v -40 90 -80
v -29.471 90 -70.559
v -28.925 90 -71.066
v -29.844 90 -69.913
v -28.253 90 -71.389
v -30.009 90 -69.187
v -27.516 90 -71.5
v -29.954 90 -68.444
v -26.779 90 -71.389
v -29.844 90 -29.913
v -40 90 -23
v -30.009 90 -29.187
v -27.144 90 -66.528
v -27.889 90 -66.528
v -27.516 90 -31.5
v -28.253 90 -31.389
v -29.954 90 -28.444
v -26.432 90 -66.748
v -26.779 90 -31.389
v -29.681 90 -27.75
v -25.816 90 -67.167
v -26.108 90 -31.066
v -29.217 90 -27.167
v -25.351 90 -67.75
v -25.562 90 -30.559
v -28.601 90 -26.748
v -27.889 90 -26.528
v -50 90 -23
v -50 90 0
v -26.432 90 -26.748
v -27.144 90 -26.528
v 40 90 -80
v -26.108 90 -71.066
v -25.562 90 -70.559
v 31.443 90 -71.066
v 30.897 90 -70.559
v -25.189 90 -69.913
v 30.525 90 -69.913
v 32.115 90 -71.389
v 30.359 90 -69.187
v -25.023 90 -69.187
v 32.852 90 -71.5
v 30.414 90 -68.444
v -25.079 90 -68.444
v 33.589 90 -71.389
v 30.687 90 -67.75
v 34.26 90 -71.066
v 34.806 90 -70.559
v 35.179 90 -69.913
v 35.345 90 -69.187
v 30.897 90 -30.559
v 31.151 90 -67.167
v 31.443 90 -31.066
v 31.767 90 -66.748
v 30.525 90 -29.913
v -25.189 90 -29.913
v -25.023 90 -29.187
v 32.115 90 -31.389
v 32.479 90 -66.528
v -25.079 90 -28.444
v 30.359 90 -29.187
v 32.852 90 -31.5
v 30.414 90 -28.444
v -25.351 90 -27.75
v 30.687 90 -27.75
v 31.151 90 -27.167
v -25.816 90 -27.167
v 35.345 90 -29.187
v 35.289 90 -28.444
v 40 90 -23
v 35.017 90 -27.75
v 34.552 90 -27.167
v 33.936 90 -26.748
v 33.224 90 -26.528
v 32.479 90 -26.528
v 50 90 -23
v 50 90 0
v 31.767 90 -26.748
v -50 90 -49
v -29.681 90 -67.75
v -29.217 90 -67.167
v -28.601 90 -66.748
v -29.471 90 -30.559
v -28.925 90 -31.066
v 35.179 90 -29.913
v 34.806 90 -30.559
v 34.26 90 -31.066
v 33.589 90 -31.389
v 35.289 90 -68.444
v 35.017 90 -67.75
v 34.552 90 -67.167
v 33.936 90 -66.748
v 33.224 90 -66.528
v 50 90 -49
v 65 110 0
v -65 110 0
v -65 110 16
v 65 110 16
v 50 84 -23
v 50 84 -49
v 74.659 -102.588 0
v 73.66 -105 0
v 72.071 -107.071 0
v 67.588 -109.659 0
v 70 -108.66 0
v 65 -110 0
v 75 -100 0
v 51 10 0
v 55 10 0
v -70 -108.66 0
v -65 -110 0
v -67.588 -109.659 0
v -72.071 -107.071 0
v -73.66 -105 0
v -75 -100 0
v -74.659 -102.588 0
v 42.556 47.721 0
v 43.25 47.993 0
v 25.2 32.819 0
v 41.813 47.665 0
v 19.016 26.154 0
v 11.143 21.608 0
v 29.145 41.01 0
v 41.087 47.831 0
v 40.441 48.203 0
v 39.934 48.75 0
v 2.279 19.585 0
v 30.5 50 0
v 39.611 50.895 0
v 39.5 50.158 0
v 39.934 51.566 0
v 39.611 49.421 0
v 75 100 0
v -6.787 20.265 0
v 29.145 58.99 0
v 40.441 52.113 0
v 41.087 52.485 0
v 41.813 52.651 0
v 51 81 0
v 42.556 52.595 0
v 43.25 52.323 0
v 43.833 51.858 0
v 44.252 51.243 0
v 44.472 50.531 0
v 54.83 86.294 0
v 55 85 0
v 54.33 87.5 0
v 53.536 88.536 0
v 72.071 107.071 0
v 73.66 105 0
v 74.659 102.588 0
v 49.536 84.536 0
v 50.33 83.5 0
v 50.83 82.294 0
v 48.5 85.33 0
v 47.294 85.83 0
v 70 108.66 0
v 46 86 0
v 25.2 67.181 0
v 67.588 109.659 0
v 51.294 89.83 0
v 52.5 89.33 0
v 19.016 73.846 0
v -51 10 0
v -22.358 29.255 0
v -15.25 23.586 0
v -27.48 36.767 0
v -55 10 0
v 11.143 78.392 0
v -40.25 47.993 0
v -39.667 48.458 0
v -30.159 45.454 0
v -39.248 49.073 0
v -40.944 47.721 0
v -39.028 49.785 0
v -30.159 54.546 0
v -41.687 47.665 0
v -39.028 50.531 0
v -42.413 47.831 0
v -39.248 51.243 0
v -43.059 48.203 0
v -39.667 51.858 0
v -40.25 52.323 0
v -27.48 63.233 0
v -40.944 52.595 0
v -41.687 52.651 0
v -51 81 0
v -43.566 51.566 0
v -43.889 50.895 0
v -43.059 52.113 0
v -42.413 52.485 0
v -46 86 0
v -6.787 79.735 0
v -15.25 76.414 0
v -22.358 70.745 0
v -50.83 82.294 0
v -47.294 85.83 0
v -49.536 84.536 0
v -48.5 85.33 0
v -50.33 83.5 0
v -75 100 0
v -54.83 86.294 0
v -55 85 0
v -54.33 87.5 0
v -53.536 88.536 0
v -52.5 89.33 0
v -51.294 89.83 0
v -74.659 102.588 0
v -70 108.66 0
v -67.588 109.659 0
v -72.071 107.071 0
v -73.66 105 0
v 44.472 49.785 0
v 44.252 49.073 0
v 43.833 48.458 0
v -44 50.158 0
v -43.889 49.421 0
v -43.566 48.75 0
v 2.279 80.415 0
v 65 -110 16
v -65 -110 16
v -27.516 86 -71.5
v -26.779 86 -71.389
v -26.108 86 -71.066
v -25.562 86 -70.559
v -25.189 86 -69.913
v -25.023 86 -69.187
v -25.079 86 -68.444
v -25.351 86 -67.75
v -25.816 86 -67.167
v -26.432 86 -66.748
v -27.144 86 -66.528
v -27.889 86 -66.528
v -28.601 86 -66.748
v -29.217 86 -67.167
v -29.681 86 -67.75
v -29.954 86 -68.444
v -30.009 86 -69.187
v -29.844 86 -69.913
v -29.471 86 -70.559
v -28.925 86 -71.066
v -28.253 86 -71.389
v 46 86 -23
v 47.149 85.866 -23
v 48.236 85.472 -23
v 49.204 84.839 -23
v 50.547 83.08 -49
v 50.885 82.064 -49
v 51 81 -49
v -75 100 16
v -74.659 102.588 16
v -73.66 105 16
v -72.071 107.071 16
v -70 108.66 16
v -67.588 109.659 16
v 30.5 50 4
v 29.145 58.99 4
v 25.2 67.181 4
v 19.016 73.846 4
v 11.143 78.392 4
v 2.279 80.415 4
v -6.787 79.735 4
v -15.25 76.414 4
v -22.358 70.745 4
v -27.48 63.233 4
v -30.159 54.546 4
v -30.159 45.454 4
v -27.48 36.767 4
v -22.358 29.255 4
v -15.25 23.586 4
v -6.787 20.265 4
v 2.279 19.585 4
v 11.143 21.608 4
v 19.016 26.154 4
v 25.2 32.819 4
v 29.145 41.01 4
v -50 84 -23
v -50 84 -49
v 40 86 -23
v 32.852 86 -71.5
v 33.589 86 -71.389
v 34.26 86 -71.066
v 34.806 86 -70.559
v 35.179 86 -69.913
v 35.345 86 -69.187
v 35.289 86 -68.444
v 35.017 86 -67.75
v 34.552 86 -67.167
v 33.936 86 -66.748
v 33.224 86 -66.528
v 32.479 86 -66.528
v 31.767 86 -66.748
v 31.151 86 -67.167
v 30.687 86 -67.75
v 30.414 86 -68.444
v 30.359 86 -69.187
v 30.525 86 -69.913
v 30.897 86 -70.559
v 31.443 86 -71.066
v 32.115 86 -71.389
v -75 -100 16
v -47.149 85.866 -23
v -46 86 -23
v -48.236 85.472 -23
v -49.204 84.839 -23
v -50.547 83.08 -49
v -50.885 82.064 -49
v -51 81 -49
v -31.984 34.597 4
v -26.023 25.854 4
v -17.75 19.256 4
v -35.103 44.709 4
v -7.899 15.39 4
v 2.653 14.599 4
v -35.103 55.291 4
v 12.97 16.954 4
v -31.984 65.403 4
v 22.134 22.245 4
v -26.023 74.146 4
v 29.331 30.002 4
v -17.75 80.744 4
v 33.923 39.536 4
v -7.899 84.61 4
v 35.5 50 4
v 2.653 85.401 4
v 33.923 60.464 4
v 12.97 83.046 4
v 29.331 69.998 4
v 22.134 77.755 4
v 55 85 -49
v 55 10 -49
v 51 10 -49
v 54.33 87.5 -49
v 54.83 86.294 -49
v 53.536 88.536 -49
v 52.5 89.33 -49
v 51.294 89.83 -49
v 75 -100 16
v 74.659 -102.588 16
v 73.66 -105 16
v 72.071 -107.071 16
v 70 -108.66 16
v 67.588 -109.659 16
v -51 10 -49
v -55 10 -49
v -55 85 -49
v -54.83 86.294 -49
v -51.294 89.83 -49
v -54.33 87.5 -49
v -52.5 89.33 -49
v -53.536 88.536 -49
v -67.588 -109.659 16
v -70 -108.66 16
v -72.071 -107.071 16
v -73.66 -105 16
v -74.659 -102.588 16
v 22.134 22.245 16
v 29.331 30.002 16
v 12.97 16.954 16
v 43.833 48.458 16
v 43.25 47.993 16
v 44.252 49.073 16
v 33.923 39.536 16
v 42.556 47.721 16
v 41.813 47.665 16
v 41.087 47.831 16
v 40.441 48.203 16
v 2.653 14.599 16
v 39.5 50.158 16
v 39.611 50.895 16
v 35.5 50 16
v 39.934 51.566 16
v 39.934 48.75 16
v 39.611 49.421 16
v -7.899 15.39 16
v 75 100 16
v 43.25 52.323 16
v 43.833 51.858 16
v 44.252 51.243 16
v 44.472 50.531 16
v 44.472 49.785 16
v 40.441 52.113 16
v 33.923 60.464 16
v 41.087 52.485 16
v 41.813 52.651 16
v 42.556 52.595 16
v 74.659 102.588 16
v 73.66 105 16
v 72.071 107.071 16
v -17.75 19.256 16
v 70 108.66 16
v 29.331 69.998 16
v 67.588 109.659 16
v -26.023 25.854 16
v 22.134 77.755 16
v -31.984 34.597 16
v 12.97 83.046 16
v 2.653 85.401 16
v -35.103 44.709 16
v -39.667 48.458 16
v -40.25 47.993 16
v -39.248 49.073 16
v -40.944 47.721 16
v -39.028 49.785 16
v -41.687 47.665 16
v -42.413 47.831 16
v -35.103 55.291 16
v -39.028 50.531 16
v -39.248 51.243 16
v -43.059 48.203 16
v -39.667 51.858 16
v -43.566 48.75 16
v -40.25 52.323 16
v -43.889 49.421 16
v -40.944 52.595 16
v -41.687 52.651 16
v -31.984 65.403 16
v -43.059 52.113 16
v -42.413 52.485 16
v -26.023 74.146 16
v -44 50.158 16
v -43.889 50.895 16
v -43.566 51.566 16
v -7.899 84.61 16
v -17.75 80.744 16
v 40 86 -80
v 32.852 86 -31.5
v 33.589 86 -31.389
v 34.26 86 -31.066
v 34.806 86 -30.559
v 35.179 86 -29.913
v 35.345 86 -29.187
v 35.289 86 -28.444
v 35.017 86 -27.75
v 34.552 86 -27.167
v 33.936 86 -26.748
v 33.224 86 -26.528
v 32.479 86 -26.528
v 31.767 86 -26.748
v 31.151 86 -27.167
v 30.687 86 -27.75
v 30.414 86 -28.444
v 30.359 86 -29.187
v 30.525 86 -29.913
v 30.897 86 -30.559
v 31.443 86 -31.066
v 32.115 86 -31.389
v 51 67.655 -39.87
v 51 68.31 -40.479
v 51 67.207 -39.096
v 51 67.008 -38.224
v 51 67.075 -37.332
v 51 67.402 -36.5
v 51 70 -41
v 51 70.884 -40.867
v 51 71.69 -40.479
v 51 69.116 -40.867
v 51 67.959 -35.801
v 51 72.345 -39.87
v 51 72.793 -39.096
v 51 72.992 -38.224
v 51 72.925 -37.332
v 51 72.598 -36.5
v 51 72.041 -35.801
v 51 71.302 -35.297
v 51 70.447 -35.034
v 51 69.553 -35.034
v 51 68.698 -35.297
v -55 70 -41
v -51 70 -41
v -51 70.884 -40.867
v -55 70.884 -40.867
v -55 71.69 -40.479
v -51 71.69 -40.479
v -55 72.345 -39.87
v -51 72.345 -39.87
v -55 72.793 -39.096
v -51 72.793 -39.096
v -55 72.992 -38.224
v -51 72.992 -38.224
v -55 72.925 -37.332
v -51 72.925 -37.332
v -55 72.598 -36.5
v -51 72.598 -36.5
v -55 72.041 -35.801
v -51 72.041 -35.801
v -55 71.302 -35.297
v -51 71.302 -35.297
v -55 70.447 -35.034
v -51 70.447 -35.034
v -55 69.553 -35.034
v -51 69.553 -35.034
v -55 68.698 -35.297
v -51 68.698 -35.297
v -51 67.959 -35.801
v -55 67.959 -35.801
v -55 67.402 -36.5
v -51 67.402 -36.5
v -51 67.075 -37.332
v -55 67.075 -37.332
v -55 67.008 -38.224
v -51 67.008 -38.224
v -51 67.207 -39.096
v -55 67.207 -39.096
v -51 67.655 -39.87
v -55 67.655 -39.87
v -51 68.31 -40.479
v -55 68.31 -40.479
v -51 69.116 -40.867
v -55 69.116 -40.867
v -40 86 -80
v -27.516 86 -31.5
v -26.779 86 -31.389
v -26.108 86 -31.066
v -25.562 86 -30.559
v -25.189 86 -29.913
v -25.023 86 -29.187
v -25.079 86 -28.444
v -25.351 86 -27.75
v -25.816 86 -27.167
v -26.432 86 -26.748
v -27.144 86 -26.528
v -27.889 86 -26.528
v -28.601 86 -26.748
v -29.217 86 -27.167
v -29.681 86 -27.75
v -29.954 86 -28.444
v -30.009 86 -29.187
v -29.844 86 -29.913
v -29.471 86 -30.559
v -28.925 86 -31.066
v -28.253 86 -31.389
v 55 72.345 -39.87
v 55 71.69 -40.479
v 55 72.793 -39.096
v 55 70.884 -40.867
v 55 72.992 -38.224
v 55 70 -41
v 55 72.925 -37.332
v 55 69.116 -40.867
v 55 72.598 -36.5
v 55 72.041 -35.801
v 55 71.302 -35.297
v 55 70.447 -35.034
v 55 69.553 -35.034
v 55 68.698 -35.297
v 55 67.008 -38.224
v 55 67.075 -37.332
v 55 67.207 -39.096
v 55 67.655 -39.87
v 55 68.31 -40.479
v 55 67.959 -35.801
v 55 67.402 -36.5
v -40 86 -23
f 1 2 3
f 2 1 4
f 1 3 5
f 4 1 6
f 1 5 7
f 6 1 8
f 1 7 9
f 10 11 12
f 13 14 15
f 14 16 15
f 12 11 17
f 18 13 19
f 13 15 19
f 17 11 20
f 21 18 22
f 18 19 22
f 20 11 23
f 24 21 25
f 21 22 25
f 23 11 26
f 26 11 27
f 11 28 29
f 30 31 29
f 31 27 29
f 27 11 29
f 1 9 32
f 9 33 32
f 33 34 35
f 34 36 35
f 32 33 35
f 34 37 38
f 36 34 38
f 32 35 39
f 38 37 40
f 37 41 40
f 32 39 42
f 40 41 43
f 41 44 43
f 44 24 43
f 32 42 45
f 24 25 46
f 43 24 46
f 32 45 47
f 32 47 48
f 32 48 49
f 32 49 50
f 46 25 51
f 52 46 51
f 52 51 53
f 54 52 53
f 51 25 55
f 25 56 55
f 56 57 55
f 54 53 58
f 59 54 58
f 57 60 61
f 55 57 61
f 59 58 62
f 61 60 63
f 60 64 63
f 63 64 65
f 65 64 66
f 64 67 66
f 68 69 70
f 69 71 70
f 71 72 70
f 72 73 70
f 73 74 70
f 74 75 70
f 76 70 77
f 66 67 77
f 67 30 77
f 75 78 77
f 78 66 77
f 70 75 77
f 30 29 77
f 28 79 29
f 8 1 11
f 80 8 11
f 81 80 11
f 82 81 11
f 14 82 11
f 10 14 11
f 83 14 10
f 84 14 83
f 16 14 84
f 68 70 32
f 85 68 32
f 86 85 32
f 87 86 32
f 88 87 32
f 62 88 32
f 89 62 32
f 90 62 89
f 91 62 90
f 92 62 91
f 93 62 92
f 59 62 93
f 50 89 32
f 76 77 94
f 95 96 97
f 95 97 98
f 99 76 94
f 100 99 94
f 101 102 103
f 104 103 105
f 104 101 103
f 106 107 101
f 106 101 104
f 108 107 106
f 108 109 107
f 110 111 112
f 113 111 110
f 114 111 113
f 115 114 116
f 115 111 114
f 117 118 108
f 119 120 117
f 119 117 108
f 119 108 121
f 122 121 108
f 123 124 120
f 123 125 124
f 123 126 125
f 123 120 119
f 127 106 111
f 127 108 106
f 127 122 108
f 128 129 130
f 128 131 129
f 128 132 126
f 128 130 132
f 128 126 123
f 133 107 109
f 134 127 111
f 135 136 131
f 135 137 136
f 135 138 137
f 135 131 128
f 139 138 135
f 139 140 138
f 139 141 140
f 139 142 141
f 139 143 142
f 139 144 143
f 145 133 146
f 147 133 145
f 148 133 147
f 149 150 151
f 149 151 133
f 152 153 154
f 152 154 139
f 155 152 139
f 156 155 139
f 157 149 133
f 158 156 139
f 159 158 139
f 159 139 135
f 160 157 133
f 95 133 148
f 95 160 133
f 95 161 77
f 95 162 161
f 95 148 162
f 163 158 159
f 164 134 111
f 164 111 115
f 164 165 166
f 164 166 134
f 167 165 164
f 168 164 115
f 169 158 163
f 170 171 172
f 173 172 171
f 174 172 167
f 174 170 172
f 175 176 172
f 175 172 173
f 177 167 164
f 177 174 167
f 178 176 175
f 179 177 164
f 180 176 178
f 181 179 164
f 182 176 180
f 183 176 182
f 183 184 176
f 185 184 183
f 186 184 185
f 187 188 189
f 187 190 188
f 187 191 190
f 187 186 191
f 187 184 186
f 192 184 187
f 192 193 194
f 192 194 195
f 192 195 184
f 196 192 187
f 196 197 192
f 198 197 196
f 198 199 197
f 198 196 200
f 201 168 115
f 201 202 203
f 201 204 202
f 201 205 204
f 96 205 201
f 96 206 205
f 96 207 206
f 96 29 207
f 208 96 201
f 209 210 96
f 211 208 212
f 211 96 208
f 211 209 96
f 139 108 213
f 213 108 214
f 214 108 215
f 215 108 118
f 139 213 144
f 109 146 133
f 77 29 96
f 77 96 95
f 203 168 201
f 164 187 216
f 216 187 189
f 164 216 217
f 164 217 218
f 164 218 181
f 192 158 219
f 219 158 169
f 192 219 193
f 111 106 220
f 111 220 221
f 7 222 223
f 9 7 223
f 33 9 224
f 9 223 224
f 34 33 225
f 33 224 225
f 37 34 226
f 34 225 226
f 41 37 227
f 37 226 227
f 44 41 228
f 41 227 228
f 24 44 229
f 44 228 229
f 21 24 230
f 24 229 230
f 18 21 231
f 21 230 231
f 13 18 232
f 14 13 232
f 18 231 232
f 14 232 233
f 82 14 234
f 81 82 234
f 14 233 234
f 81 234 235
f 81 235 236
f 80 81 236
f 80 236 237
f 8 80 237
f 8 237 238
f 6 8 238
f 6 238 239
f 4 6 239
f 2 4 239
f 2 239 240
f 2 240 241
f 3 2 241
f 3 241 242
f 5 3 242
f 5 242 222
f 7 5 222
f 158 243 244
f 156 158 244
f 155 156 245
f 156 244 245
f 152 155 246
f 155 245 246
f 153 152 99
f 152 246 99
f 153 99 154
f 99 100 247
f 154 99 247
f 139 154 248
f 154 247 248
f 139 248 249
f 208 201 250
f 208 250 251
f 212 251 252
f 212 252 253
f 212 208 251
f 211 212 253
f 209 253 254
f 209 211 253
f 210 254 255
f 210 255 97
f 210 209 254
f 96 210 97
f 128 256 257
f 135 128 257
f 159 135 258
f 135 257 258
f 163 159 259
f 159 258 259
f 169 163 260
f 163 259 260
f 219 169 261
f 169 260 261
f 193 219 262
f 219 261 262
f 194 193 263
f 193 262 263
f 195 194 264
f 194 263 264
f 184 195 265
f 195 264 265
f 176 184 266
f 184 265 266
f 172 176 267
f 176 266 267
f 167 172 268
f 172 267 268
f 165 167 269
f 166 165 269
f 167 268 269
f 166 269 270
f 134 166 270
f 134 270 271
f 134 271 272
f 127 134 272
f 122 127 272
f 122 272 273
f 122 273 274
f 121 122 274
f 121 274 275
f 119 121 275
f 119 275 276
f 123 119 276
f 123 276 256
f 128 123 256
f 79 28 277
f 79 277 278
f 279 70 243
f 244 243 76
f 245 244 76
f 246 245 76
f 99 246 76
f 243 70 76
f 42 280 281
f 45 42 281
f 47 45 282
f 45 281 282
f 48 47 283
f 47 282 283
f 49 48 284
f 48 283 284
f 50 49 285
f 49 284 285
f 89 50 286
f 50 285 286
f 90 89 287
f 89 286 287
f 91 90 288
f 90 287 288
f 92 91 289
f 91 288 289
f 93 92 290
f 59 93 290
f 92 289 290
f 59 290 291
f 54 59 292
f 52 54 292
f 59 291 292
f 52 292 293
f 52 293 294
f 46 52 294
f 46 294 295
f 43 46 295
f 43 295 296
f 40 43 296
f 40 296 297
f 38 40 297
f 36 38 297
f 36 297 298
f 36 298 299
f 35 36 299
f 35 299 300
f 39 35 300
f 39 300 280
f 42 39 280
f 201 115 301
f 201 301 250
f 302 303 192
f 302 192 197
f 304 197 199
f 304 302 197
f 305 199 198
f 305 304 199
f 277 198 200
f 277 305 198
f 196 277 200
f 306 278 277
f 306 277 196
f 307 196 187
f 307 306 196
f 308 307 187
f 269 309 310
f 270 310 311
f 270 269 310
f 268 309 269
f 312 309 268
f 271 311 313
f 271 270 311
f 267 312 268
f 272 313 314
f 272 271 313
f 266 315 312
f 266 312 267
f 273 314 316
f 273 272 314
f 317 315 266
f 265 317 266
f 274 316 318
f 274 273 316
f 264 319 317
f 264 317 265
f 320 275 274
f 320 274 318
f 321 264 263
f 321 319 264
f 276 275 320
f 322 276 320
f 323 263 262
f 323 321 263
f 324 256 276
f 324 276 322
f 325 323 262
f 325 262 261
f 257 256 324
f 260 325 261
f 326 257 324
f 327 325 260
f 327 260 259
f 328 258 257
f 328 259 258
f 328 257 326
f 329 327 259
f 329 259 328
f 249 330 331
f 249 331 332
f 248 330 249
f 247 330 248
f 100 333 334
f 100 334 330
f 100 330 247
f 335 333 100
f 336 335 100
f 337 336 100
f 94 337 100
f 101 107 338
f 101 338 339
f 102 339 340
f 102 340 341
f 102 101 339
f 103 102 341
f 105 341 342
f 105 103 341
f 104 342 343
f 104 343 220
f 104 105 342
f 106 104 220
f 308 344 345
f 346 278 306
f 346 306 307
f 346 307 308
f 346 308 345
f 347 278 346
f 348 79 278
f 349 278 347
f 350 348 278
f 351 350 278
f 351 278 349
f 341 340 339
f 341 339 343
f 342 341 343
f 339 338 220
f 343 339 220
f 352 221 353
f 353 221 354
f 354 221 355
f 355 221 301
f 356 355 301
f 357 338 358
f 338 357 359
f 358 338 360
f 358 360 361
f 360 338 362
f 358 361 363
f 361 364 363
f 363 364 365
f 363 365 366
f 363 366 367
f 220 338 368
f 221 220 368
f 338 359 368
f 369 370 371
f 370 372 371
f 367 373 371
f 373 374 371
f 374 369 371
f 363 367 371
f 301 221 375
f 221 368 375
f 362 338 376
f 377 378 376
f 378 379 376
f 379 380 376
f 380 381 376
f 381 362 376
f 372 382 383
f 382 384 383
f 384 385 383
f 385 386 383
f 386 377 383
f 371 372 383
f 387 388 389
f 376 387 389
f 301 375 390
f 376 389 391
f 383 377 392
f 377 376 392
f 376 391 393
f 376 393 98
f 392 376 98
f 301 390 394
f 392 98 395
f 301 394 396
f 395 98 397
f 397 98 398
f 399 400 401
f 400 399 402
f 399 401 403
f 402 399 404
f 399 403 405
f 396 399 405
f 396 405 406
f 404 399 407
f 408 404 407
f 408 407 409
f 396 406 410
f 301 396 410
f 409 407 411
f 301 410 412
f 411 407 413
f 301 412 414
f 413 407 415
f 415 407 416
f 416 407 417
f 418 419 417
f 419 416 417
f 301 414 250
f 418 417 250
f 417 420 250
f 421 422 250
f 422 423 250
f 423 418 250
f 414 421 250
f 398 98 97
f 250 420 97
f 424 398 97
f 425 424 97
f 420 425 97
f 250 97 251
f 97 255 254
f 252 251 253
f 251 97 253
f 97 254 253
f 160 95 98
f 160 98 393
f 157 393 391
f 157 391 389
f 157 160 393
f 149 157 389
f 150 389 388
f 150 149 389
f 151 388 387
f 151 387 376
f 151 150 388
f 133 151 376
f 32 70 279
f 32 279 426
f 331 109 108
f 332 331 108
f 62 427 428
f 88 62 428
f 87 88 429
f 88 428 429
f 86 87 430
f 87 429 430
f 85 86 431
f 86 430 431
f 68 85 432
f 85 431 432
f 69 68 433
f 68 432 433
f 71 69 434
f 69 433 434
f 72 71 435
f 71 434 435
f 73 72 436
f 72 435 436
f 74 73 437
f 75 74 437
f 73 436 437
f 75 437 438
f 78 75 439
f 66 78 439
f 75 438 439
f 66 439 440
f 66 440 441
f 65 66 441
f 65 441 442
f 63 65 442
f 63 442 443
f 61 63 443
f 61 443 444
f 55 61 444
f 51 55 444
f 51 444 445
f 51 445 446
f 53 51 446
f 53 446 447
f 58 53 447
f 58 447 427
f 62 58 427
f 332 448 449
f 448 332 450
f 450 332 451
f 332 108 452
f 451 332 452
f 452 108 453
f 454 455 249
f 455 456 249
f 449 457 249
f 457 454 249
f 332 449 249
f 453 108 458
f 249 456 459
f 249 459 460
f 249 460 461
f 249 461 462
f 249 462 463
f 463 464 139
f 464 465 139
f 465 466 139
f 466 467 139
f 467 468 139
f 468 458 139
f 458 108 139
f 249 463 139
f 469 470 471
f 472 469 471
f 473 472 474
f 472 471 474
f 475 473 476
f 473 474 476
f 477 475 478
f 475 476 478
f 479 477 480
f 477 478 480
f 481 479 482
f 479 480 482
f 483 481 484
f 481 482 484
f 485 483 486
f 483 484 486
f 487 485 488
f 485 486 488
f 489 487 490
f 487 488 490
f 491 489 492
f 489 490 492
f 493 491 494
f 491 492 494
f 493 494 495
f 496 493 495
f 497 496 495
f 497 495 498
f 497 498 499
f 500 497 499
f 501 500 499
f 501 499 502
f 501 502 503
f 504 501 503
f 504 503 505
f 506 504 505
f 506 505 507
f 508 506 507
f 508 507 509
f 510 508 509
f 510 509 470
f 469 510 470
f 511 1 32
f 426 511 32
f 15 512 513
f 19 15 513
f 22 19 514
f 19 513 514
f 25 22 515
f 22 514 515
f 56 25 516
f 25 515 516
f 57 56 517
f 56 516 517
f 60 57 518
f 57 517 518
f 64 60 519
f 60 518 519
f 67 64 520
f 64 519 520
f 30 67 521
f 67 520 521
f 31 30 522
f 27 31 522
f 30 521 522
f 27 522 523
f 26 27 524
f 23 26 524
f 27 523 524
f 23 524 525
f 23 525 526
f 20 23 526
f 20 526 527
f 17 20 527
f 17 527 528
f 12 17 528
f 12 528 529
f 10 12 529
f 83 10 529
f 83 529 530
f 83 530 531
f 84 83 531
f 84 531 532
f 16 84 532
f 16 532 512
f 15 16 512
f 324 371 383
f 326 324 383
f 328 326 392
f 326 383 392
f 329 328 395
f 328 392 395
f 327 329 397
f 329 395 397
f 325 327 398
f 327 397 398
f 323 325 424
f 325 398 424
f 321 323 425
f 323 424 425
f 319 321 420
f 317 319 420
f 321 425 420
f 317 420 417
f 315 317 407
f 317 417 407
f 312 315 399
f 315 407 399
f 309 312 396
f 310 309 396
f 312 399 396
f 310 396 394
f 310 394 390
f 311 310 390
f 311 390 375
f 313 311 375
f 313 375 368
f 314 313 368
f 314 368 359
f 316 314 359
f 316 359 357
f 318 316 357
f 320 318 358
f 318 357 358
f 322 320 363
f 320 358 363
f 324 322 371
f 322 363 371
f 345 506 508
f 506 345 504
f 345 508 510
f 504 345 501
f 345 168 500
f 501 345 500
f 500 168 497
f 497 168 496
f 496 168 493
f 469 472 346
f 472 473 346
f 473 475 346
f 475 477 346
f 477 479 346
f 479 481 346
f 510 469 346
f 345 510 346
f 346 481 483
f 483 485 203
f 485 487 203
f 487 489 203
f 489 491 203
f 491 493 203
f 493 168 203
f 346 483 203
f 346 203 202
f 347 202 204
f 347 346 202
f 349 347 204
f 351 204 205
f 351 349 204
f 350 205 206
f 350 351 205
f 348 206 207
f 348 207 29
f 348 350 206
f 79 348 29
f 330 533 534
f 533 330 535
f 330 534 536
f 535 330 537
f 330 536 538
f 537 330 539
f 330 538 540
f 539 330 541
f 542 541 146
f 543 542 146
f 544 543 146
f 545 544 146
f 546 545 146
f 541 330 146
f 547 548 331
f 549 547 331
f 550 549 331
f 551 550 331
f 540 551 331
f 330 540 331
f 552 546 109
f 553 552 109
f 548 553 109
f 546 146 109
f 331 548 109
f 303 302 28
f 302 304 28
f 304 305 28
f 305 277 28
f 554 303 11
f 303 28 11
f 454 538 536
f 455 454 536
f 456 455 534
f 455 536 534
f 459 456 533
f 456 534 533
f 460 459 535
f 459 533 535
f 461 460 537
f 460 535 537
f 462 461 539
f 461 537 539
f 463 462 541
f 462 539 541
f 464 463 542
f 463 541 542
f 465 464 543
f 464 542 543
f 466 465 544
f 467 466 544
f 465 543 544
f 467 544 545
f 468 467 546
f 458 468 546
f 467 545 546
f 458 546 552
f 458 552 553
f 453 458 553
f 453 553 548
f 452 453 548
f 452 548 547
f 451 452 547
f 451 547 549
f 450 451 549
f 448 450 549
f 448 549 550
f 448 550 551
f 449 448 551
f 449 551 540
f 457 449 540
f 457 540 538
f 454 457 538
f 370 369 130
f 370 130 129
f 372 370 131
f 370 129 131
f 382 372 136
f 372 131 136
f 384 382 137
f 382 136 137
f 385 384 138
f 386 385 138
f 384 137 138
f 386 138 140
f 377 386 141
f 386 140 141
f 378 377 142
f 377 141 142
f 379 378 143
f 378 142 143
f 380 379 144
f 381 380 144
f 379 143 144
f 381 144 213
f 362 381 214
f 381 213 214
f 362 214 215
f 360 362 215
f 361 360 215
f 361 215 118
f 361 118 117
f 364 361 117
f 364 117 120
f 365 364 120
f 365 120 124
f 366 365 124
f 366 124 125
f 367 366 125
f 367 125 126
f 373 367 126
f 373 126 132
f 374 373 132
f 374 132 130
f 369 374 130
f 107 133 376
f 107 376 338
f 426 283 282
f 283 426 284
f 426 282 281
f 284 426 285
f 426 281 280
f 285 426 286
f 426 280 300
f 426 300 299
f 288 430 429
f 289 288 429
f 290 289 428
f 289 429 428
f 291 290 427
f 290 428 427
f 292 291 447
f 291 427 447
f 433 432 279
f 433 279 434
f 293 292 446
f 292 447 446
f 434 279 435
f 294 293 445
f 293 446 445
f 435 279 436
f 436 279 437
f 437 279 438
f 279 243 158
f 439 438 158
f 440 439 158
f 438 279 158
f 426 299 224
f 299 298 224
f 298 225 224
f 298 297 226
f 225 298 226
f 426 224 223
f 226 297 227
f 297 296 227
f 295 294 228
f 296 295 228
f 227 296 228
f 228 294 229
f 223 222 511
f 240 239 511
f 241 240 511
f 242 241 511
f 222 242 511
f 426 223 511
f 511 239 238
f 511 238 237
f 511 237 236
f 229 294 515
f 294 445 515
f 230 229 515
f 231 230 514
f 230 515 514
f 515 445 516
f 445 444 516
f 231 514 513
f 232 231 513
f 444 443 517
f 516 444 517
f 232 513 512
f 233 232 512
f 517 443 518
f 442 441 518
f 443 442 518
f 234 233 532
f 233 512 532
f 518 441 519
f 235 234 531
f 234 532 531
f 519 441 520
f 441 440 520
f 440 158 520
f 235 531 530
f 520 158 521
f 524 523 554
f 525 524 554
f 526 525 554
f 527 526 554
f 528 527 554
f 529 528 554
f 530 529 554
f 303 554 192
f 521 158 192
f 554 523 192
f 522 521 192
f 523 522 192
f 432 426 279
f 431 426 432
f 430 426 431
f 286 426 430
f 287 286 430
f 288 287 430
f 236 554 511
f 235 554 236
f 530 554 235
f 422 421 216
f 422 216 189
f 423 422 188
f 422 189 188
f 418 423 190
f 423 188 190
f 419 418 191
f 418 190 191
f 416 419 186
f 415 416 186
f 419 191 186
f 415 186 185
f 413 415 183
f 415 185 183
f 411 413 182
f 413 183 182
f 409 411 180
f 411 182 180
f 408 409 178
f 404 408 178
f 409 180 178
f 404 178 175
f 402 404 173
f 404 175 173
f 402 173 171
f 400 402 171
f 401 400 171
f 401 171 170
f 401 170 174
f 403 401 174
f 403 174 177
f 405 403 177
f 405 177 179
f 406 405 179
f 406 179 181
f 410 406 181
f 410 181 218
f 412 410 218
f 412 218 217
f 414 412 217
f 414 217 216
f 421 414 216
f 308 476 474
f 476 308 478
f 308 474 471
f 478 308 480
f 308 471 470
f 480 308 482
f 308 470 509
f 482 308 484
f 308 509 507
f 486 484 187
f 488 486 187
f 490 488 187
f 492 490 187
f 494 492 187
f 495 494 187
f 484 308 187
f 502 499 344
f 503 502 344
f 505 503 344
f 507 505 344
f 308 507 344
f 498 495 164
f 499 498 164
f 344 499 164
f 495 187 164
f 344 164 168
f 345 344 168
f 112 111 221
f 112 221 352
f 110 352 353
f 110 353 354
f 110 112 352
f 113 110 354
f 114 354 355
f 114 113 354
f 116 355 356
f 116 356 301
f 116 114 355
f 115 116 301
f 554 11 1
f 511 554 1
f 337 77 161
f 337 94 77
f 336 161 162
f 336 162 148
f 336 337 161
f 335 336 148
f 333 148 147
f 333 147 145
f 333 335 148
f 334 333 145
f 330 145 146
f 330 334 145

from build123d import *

# Parameters (mm, degrees)
SALIENTE_EXTRUIR1_DEPTH = 16
CROQUIS3_R              = 30.5
CORTAR_EXTRUIR3_DEPTH   = 135.093251135
CROQUIS4_R              = 35.5
CORTAR_EXTRUIR4_DEPTH   = 12
SALIENTE_EXTRUIR2_DEPTH = 49
CROQUIS6_W              = 80
CROQUIS6_H              = 62
SALIENTE_EXTRUIR4_DEPTH = 4
CROQUIS8_W              = 10
CROQUIS8_H              = 34.666666667
CORTAR_EXTRUIR6_DEPTH   = 229.089894559
CROQUIS9_R              = 3
CORTAR_EXTRUIR7_DEPTH   = 189.148877222
REDONDEO1_R             = 5
CROQUIS10_R             = 2.5
CORTAR_EXTRUIR8_DEPTH   = 156.32224567
CROQUIS11_R             = 2.5
CORTAR_EXTRUIR9_DEPTH   = 10


with BuildPart() as part:
    # Croquis2 → Saliente-Extruir1 (new body)
    with BuildSketch(Plane.XY):
        with BuildLine():
            Line((-65, 110), (65, 110))
            ThreePointArc((65, 110), (72.071067812, 107.071067812), (75, 100))
            Line((75, 100), (75, -100))
            ThreePointArc((75, -100), (72.071067812, -107.071067812), (65, -110))
            Line((65, -110), (-65, -110))
            ThreePointArc((-65, -110), (-72.071067812, -107.071067812), (-75, -100))
            Line((-75, -100), (-75, 100))
            ThreePointArc((-75, 100), (-72.071067812, 107.071067812), (-65, 110))
        make_face()
    extrude(amount=SALIENTE_EXTRUIR1_DEPTH)

    # Croquis3 → Cortar-Extruir3 (cut, through all)
    with BuildSketch(Plane.XY.offset(16)):
        with Locations((0, 50)):
            Circle(CROQUIS3_R)
    extrude(amount=-CORTAR_EXTRUIR3_DEPTH, mode=Mode.SUBTRACT)

    # Croquis4 → Cortar-Extruir4 (cut)
    with BuildSketch(Plane.XY.offset(16)):
        with Locations((0, 50)):
            Circle(CROQUIS4_R)
    extrude(amount=-CORTAR_EXTRUIR4_DEPTH, mode=Mode.SUBTRACT)

    # Croquis5 → Saliente-Extruir2 (add)
    with BuildSketch(Plane(origin=(0, 0, 0), x_dir=(-1, 0, 0), z_dir=(0, 0, -1))):
        Polygon((-55, 83), (-55, 10), (-51, 10), (-51, 79), (-51, 86), (-44, 86), (44, 86), (51, 86), (51, 79), (51, 10), (55, 10), (55, 83), (55, 90), (48, 90), (-48, 90), (-55, 90), align=None)
    extrude(amount=SALIENTE_EXTRUIR2_DEPTH)

    # Croquis6 → Saliente-Extruir4 (add)
    with BuildSketch(Plane(origin=(0, 90, 0), x_dir=(1, 0, 0), z_dir=(0, 1, 0))):
        with Locations((0, 49)):
            Rectangle(CROQUIS6_W, CROQUIS6_H)
    extrude(amount=-SALIENTE_EXTRUIR4_DEPTH)

    # Croquis8 → Cortar-Extruir6 (cut, through all)
    with BuildSketch(Plane(origin=(0, 90, 0), x_dir=(1, 0, 0), z_dir=(0, 1, 0))):
        with Locations((-45, 40.333333334)):
            Rectangle(CROQUIS8_W, CROQUIS8_H)
        with Locations((45, 40.333333334)):
            Rectangle(CROQUIS8_W, CROQUIS8_H)
    extrude(amount=-CORTAR_EXTRUIR6_DEPTH, mode=Mode.SUBTRACT)

    # Croquis9 → Cortar-Extruir7 (cut, through all)
    with BuildSketch(Plane(origin=(55, 0, 0), x_dir=(0, 0, -1), z_dir=(1, 0, 0))):
        with Locations((38, 70)):
            Circle(CROQUIS9_R)
    extrude(amount=-CORTAR_EXTRUIR7_DEPTH, mode=Mode.SUBTRACT)

    # Redondeo1
    redondeo1_edges = [part.edges().sort_by_distance(p)[0] for p in [
        (-51, 86, -24.5),
        (51, 86, -24.5),
        (55, 90, -24.5),
        (-55, 90, -24.5),
    ]]
    fillet(redondeo1_edges, radius=REDONDEO1_R - 0.0001)  # a hair under: the kernel refuses the full size

    # Croquis10 → Cortar-Extruir8 (cut, through all)
    with BuildSketch(Plane(origin=(0, 0, 0), x_dir=(-1, 0, 0), z_dir=(0, 0, -1))):
        with Locations((-42, 50.158024554)):
            Circle(CROQUIS10_R)
        with Locations((41.5, 50.158024554)):
            Circle(CROQUIS10_R)
    extrude(amount=-CORTAR_EXTRUIR8_DEPTH, mode=Mode.SUBTRACT)

    # Croquis11 → Cortar-Extruir9 (cut)
    with BuildSketch(Plane.XZ.offset(-86)):
        with Locations(Location((32.851728302, -29, 0), (0, 0, 270))):
            Circle(CROQUIS11_R)
        with Locations(Location((32.851728302, -69, 0), (0, 0, 270))):
            Circle(CROQUIS11_R)
        with Locations(Location((-27.516343247, -69, 0), (0, 0, 270))):
            Circle(CROQUIS11_R)
        with Locations(Location((-27.516343247, -29, 0), (0, 0, 270))):
            Circle(CROQUIS11_R)
    extrude(amount=-CORTAR_EXTRUIR9_DEPTH, mode=Mode.SUBTRACT)


solid = part.part
